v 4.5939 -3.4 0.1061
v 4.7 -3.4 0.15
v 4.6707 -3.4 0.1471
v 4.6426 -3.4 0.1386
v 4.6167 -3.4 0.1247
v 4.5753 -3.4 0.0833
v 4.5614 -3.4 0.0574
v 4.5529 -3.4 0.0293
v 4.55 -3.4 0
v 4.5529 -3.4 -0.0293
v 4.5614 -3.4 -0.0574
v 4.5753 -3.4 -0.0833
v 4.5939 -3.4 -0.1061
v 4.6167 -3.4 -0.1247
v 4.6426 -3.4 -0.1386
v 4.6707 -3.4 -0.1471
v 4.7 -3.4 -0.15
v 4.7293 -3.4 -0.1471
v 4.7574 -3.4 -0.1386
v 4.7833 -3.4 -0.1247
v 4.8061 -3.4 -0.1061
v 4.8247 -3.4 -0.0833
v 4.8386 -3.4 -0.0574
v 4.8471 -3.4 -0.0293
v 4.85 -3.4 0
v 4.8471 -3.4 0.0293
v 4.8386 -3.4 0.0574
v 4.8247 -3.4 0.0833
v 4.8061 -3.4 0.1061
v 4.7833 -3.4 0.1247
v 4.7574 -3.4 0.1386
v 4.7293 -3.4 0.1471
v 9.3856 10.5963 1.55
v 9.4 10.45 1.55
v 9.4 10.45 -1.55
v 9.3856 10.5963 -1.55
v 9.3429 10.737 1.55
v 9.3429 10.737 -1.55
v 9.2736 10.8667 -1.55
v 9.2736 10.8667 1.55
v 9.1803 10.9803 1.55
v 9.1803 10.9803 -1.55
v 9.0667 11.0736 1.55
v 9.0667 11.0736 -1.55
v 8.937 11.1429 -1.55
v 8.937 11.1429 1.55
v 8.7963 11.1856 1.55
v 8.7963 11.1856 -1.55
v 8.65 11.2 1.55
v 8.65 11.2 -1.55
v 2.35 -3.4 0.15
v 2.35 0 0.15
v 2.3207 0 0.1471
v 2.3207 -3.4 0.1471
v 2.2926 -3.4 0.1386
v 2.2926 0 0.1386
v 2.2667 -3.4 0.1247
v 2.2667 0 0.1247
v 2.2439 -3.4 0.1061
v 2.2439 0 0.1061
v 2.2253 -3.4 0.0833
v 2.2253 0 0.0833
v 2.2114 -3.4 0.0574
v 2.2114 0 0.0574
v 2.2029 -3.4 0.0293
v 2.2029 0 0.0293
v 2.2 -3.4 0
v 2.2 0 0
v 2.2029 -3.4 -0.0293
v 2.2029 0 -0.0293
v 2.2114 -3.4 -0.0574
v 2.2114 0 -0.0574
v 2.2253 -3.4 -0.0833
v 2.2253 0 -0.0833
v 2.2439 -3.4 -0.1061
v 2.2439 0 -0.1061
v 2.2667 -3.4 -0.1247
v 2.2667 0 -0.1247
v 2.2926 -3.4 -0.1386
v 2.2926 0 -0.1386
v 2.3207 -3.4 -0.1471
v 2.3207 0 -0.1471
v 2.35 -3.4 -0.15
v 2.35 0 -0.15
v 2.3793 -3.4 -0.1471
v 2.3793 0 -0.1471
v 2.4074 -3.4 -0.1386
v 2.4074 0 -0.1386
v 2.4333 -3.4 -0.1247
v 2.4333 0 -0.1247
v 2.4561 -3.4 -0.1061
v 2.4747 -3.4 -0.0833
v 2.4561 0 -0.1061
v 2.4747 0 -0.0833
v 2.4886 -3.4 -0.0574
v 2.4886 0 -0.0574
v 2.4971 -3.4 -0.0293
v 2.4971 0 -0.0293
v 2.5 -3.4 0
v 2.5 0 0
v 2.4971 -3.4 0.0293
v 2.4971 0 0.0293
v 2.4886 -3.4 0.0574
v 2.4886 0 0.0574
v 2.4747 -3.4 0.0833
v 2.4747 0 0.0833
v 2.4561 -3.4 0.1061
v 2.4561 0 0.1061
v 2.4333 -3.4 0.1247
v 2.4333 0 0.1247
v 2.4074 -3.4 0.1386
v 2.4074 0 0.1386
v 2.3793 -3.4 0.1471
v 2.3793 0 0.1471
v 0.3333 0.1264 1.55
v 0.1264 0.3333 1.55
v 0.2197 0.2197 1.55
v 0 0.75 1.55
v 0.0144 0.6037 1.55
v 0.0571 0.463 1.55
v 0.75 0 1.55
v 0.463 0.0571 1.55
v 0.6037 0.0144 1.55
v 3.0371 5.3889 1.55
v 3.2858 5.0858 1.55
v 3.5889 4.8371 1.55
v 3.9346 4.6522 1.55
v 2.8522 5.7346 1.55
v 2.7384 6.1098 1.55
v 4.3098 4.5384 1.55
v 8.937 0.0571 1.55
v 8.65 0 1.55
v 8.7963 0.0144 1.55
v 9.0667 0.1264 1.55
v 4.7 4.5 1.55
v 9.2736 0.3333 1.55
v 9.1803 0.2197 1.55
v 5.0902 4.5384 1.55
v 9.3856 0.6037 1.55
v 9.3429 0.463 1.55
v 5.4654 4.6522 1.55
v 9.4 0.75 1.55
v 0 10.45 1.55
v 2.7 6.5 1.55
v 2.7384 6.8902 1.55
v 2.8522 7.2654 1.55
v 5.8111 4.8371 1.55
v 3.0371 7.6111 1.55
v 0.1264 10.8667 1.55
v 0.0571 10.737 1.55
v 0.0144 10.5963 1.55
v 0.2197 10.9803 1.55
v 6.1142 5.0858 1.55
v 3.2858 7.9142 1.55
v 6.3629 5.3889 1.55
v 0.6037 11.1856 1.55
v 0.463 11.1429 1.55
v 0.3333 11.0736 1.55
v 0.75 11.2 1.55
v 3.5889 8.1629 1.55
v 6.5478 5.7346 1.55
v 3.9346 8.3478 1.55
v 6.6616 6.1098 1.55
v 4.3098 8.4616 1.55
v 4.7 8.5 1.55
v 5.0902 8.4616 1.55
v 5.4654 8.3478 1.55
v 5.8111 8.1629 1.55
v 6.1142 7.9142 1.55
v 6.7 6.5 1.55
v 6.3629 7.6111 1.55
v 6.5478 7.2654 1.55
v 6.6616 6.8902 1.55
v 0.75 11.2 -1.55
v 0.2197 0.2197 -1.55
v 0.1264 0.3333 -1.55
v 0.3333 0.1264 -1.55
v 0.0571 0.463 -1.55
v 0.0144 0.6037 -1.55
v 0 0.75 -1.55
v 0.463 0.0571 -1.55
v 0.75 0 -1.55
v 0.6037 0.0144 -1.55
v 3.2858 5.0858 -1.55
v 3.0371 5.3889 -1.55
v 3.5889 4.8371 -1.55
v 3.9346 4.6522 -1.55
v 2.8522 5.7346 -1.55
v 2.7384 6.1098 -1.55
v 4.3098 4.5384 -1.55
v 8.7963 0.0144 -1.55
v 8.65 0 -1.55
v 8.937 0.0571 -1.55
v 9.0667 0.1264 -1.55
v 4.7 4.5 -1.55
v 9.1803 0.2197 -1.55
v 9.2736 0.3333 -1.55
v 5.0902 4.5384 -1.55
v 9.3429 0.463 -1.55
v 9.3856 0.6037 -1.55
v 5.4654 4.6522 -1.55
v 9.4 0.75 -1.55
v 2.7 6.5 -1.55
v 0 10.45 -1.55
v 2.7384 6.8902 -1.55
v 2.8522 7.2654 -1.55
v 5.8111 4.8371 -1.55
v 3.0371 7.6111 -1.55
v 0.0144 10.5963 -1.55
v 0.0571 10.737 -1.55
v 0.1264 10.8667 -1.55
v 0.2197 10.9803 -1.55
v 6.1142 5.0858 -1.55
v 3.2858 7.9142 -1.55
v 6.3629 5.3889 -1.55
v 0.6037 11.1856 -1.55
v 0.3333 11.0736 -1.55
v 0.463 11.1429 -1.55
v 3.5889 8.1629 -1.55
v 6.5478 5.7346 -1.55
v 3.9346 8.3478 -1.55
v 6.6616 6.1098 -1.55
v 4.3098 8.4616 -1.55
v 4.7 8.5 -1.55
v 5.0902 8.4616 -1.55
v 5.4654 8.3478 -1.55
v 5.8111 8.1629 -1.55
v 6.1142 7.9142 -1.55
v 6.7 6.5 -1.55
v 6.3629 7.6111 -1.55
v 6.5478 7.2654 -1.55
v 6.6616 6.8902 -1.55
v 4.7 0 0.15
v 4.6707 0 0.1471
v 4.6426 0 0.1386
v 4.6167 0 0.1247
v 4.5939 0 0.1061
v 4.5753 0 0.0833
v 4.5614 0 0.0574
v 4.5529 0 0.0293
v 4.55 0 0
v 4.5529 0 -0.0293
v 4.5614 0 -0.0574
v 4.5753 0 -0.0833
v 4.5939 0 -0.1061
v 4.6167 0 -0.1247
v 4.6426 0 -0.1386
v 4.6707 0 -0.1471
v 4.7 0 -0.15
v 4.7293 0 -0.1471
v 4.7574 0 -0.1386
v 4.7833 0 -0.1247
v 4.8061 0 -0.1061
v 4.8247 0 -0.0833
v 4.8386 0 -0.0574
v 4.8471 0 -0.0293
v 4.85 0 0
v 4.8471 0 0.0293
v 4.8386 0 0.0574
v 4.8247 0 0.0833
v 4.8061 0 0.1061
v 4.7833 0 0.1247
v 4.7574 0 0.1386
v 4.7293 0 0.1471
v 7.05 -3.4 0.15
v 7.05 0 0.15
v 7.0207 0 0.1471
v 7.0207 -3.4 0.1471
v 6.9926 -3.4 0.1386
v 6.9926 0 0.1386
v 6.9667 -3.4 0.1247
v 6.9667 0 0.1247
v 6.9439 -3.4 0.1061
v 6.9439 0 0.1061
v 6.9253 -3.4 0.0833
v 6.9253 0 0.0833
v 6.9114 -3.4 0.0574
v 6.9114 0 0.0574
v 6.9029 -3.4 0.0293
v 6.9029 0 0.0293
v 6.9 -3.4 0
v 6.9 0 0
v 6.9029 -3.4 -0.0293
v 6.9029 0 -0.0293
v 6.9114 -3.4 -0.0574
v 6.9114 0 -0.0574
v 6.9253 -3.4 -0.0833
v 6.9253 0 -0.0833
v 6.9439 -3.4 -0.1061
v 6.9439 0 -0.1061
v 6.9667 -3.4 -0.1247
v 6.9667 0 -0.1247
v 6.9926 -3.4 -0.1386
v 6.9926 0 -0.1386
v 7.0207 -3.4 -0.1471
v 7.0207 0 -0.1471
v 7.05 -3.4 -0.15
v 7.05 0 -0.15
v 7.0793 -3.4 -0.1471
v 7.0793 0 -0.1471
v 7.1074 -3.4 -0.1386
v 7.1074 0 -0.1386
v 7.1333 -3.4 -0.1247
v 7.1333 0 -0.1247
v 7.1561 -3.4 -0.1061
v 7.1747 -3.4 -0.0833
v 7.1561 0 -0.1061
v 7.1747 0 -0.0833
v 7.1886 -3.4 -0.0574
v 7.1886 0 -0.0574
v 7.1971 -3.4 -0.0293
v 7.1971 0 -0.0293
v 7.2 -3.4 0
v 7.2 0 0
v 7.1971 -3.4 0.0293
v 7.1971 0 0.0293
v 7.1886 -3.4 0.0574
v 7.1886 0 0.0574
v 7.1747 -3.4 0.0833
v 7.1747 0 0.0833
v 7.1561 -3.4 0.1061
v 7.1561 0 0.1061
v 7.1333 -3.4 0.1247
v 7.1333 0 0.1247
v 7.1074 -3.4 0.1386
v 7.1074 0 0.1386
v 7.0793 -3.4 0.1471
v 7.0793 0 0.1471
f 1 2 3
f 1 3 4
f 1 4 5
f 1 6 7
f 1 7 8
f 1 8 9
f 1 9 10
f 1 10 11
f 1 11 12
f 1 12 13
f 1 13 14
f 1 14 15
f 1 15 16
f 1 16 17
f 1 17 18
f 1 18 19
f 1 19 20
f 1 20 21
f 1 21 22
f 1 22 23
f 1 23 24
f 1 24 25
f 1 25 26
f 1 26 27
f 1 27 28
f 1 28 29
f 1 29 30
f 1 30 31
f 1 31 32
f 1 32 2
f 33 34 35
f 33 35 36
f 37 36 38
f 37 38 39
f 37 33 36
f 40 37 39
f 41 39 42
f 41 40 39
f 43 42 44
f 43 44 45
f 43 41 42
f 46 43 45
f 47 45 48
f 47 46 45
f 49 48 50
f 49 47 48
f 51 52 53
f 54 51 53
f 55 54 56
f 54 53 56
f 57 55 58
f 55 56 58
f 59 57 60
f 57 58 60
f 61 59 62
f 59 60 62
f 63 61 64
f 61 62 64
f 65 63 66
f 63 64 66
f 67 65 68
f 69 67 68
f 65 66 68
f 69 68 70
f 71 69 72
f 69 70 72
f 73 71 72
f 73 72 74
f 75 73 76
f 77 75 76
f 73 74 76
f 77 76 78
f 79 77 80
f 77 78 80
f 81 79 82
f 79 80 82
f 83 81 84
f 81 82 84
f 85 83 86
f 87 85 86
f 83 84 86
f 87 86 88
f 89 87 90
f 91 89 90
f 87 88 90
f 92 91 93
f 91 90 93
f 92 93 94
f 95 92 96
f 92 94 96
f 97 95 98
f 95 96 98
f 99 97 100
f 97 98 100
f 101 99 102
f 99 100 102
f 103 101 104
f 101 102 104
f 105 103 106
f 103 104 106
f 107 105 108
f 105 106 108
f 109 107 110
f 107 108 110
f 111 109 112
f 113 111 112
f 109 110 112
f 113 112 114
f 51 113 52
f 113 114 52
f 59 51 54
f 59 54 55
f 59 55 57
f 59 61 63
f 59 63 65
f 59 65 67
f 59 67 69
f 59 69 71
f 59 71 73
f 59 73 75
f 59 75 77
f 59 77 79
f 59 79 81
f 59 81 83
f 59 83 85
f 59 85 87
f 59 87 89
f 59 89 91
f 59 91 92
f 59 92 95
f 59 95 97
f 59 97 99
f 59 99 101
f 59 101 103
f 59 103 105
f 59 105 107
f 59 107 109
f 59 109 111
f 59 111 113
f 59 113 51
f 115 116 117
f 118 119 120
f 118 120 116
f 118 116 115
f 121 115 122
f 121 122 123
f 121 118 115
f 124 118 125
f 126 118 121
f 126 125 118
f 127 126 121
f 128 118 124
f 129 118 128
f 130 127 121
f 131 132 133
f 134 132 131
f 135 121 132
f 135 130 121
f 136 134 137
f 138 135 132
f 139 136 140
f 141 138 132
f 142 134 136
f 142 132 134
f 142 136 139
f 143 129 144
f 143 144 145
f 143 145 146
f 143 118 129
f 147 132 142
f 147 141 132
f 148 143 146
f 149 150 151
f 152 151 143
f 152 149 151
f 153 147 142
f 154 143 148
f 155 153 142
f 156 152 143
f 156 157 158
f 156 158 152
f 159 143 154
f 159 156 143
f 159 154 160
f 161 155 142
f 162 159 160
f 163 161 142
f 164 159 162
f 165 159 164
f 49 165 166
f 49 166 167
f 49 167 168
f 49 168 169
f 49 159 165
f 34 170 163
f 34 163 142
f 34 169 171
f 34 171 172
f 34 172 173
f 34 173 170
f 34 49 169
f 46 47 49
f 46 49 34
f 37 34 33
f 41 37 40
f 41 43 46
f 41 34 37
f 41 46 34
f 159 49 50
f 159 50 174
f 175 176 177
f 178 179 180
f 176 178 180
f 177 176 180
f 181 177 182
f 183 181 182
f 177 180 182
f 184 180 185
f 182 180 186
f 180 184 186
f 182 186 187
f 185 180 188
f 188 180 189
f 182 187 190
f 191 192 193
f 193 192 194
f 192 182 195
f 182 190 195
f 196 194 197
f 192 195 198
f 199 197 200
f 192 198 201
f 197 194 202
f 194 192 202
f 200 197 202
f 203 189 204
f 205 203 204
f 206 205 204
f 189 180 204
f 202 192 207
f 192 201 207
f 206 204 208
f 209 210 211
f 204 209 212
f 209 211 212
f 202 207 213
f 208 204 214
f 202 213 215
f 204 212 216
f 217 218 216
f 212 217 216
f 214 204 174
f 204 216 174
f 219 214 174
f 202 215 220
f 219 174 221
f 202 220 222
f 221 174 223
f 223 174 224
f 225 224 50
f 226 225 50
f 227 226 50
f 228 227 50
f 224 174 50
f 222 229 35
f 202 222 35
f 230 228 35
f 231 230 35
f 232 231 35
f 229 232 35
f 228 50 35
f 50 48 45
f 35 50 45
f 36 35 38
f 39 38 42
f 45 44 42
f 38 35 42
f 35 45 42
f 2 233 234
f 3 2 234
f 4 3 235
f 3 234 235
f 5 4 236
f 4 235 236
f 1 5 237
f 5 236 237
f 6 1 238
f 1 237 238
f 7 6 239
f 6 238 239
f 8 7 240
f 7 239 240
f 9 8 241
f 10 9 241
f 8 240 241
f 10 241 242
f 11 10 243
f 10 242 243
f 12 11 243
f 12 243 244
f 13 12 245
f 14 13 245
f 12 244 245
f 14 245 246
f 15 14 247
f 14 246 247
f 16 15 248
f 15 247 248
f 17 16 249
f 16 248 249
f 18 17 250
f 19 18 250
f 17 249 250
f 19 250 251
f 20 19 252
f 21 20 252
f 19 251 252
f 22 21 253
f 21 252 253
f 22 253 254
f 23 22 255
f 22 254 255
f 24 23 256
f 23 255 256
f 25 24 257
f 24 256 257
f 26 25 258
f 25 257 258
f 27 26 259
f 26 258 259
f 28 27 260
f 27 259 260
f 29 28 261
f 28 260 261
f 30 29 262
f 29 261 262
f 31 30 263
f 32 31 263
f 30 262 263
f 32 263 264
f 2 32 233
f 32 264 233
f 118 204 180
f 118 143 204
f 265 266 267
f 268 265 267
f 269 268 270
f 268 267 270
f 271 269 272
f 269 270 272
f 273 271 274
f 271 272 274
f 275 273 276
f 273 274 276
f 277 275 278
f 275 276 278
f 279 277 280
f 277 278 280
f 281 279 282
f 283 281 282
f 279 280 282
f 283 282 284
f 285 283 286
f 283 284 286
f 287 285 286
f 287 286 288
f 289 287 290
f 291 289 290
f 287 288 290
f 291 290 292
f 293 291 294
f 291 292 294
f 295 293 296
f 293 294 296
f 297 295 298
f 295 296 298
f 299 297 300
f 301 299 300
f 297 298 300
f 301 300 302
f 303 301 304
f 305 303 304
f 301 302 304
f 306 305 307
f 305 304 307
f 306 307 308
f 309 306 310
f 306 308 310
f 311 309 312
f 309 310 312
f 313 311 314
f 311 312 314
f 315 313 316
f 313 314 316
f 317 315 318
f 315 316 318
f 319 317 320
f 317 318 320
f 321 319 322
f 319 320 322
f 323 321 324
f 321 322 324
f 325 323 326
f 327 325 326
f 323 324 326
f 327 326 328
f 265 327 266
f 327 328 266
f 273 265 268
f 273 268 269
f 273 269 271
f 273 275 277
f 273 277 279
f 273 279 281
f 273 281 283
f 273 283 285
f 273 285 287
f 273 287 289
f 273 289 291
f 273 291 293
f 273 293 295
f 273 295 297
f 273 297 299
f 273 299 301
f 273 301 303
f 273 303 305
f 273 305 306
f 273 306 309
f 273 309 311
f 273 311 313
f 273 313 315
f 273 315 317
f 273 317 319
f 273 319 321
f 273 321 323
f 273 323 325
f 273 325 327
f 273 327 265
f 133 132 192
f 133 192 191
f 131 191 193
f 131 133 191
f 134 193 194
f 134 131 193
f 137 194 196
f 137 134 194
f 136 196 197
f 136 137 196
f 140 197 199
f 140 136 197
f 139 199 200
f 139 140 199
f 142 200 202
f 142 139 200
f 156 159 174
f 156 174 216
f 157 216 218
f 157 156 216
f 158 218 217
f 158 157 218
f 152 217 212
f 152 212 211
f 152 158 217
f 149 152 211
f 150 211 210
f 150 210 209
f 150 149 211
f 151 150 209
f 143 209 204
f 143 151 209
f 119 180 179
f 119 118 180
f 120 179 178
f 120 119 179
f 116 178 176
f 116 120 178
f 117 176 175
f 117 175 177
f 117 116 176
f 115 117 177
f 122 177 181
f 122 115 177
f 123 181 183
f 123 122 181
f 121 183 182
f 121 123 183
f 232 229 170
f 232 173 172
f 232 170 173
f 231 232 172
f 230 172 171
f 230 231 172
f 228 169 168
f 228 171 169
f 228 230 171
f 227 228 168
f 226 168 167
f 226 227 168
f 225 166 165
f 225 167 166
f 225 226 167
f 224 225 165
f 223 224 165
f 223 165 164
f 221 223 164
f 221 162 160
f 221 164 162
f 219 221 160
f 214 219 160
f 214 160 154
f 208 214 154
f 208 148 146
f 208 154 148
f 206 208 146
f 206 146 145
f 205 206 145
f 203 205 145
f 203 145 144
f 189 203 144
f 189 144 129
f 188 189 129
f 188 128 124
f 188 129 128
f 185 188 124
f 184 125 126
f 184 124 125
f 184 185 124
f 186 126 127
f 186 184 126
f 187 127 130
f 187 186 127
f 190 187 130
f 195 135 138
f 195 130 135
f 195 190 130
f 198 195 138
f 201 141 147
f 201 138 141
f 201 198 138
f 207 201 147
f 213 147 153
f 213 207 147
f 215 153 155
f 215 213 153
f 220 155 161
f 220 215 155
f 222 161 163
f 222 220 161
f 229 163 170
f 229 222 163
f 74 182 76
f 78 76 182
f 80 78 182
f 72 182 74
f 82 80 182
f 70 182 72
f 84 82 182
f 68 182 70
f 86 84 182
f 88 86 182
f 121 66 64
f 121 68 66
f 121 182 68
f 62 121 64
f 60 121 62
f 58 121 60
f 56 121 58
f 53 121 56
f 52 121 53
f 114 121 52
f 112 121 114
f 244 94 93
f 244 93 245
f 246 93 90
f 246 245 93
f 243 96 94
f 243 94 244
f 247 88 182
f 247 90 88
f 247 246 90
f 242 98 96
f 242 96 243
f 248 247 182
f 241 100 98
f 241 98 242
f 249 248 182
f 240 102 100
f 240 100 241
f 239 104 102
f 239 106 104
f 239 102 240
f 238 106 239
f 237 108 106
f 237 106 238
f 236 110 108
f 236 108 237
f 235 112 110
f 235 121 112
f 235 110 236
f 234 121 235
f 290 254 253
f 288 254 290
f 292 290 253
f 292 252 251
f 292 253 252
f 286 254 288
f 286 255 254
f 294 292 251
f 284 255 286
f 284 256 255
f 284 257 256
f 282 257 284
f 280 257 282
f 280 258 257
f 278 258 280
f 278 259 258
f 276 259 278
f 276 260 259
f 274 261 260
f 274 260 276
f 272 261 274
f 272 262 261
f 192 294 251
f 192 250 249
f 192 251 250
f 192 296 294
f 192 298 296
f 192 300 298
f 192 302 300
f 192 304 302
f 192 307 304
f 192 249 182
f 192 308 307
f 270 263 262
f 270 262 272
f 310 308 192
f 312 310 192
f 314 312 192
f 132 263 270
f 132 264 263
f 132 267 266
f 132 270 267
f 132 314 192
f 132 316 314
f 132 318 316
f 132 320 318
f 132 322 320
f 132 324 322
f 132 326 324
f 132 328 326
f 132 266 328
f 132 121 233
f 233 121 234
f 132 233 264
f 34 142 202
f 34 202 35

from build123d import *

# Parameters (mm, degrees)
EXT_BODY_DEPTH          = 1.55
CUT_POT_HOLE_DEPTH      = 15.946906034
CUT_POT_HOLE_DEPTH_BACK = 15.946906034
SKETCH2_R               = 2
SKETCH5_R               = 0.15
EXT_PINS_DEPTH          = 3.4


with BuildPart() as part:
    # Sketch1 → ext-body (new, symmetric)
    with BuildSketch(Plane.XY):
        with BuildLine():
            Line((0.75, 0), (8.65, 0))
            ThreePointArc((8.65, 0), (9.180330086, 0.219669914), (9.4, 0.75))
            Line((9.4, 0.75), (9.4, 10.45))
            ThreePointArc((9.4, 10.45), (9.180330086, 10.980330086), (8.65, 11.2))
            Line((8.65, 11.2), (0.75, 11.2))
            ThreePointArc((0.75, 11.2), (0.219669914, 10.980330086), (0, 10.45))
            Line((0, 10.45), (0, 0.75))
            ThreePointArc((0, 0.75), (0.219669914, 0.219669914), (0.75, 0))
        make_face()
    extrude(amount=EXT_BODY_DEPTH, both=True)

    # Sketch2 → cut-pot_hole (cut, two sides: drawn at the far end of the back side and taken through both)
    with BuildSketch(Plane.XY.offset(1.55).offset(-CUT_POT_HOLE_DEPTH_BACK)):
        with Locations((4.7, 6.5)):
            Circle(SKETCH2_R)
    extrude(amount=CUT_POT_HOLE_DEPTH + CUT_POT_HOLE_DEPTH_BACK, mode=Mode.SUBTRACT)

    # Sketch5 → ext-pins (add)
    with BuildSketch(Plane.XZ):
        with Locations(Location((2.35, 0, 0), (0, 0, 90))):
            Circle(SKETCH5_R)
        with Locations(Location((4.7, 0, 0), (0, 0, 90))):
            Circle(SKETCH5_R)
        with Locations(Location((7.05, 0, 0), (0, 0, 90))):
            Circle(SKETCH5_R)
    extrude(amount=EXT_PINS_DEPTH)


solid = part.part
